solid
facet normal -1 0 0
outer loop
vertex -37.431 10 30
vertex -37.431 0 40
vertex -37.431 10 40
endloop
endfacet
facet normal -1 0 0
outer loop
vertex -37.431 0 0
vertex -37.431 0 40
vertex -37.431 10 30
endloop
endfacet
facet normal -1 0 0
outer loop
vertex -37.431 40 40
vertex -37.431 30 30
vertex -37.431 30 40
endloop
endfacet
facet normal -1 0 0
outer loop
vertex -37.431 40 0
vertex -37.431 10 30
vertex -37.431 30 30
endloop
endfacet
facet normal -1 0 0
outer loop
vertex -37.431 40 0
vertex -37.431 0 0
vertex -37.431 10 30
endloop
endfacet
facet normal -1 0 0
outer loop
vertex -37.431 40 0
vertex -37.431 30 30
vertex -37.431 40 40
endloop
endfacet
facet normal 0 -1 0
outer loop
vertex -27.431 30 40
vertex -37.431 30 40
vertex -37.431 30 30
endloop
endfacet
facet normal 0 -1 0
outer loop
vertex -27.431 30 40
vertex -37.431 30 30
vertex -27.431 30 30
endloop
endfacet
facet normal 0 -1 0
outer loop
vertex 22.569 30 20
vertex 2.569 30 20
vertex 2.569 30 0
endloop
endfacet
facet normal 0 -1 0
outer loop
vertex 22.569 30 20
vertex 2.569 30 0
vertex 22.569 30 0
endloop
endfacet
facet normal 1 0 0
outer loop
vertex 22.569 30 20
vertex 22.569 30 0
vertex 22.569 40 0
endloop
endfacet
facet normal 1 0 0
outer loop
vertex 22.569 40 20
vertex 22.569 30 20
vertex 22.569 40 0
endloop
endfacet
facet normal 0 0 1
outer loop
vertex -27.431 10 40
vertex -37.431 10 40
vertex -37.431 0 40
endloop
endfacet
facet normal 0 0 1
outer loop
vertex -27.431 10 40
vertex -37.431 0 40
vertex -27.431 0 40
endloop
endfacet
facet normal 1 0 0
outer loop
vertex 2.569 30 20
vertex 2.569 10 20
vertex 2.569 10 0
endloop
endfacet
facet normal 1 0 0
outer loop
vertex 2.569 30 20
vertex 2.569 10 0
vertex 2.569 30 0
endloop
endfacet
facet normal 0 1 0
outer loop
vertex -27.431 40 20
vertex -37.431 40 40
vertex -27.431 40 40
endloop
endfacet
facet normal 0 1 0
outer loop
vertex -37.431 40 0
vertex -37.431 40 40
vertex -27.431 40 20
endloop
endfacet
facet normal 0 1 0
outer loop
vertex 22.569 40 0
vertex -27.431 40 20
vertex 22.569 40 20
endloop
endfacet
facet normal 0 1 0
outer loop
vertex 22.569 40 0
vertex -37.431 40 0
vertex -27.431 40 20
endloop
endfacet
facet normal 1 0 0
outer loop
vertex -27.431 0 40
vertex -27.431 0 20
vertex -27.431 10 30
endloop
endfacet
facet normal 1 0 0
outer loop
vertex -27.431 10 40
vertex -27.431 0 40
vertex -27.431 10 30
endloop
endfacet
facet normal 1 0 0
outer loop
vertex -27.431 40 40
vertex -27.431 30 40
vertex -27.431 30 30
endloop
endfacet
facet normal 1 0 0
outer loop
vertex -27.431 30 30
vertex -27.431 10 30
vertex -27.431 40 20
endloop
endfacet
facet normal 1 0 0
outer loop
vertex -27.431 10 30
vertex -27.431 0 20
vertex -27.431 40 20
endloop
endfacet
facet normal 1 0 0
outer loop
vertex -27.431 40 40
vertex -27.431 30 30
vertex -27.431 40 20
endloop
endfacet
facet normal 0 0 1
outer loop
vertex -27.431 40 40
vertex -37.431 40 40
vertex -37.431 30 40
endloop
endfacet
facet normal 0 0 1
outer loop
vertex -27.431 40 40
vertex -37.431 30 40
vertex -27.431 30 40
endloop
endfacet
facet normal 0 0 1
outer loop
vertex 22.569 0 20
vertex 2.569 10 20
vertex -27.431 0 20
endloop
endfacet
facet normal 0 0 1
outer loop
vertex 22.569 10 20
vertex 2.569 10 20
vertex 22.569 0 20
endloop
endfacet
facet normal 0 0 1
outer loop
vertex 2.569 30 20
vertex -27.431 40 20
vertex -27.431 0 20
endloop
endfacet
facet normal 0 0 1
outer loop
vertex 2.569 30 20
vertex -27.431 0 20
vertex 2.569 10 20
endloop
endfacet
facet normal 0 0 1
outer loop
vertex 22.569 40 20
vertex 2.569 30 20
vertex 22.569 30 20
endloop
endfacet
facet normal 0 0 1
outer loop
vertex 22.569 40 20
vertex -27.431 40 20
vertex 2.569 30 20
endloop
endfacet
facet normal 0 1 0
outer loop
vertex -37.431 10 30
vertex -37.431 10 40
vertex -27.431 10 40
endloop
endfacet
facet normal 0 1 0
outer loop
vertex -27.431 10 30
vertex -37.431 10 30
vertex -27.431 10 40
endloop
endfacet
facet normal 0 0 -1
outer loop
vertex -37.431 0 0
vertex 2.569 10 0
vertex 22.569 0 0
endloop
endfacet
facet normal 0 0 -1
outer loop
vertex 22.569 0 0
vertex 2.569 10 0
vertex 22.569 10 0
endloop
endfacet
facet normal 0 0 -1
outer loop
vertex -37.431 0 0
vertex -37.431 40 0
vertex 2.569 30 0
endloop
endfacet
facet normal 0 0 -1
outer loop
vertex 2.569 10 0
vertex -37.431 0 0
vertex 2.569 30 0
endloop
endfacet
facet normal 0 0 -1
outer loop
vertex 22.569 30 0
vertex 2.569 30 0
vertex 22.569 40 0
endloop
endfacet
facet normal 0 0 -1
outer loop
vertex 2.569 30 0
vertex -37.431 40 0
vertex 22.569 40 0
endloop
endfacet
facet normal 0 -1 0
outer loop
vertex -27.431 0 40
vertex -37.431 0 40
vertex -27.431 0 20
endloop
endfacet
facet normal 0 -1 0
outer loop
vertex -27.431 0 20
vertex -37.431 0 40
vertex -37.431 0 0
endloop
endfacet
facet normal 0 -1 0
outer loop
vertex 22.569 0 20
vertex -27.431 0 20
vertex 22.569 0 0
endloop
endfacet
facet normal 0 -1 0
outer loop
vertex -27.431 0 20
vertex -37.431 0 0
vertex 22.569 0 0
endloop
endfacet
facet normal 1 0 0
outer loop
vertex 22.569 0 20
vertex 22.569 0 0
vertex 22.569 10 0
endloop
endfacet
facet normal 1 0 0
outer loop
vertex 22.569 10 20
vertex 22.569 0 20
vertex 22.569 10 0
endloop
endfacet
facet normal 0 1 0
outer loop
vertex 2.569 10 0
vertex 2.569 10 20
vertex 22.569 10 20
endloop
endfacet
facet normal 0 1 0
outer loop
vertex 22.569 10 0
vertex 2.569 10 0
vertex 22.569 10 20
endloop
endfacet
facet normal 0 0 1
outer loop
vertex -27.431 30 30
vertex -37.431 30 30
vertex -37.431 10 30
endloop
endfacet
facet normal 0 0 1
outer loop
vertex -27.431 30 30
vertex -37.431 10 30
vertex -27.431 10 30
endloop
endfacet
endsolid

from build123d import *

# Parameters (mm, degrees)
F0_W     = 60
F0_H     = 40
F1_DEPTH = 20
F3_W     = 10
F3_H     = 40
F4_DEPTH = 20
F5_W     = 20
F5_H     = 20
F6_DEPTH = 20.001
F7_W     = 10
F7_H     = 20
F8_DEPTH = 10


with BuildPart() as f1:
    # F0 (on Top) → F1 (new body)
    with BuildSketch(Plane.XY):
        with Locations((-7.431195, 20)):
            Rectangle(F0_W, F0_H)
    extrude(amount=F1_DEPTH)

    # F3 (on face) → F4 (join)
    with BuildSketch(Plane.XY.offset(20)):
        with Locations((-32.431195, 20)):
            Rectangle(F3_W, F3_H)
    extrude(amount=F4_DEPTH)

    # F5 (on face) → F6 (cut, through all)
    with BuildSketch(Plane.XY.offset(20)):
        with Locations((12.568805, 20)):
            Rectangle(F5_W, F5_H)
    extrude(amount=-F6_DEPTH, mode=Mode.SUBTRACT)

    # F7 (on face) → F8 (cut)
    with BuildSketch(Plane.XY.offset(40)):
        with Locations((-32.431195, 20)):
            Rectangle(F7_W, F7_H)
    extrude(amount=-F8_DEPTH, mode=Mode.SUBTRACT)


solid = f1.part
